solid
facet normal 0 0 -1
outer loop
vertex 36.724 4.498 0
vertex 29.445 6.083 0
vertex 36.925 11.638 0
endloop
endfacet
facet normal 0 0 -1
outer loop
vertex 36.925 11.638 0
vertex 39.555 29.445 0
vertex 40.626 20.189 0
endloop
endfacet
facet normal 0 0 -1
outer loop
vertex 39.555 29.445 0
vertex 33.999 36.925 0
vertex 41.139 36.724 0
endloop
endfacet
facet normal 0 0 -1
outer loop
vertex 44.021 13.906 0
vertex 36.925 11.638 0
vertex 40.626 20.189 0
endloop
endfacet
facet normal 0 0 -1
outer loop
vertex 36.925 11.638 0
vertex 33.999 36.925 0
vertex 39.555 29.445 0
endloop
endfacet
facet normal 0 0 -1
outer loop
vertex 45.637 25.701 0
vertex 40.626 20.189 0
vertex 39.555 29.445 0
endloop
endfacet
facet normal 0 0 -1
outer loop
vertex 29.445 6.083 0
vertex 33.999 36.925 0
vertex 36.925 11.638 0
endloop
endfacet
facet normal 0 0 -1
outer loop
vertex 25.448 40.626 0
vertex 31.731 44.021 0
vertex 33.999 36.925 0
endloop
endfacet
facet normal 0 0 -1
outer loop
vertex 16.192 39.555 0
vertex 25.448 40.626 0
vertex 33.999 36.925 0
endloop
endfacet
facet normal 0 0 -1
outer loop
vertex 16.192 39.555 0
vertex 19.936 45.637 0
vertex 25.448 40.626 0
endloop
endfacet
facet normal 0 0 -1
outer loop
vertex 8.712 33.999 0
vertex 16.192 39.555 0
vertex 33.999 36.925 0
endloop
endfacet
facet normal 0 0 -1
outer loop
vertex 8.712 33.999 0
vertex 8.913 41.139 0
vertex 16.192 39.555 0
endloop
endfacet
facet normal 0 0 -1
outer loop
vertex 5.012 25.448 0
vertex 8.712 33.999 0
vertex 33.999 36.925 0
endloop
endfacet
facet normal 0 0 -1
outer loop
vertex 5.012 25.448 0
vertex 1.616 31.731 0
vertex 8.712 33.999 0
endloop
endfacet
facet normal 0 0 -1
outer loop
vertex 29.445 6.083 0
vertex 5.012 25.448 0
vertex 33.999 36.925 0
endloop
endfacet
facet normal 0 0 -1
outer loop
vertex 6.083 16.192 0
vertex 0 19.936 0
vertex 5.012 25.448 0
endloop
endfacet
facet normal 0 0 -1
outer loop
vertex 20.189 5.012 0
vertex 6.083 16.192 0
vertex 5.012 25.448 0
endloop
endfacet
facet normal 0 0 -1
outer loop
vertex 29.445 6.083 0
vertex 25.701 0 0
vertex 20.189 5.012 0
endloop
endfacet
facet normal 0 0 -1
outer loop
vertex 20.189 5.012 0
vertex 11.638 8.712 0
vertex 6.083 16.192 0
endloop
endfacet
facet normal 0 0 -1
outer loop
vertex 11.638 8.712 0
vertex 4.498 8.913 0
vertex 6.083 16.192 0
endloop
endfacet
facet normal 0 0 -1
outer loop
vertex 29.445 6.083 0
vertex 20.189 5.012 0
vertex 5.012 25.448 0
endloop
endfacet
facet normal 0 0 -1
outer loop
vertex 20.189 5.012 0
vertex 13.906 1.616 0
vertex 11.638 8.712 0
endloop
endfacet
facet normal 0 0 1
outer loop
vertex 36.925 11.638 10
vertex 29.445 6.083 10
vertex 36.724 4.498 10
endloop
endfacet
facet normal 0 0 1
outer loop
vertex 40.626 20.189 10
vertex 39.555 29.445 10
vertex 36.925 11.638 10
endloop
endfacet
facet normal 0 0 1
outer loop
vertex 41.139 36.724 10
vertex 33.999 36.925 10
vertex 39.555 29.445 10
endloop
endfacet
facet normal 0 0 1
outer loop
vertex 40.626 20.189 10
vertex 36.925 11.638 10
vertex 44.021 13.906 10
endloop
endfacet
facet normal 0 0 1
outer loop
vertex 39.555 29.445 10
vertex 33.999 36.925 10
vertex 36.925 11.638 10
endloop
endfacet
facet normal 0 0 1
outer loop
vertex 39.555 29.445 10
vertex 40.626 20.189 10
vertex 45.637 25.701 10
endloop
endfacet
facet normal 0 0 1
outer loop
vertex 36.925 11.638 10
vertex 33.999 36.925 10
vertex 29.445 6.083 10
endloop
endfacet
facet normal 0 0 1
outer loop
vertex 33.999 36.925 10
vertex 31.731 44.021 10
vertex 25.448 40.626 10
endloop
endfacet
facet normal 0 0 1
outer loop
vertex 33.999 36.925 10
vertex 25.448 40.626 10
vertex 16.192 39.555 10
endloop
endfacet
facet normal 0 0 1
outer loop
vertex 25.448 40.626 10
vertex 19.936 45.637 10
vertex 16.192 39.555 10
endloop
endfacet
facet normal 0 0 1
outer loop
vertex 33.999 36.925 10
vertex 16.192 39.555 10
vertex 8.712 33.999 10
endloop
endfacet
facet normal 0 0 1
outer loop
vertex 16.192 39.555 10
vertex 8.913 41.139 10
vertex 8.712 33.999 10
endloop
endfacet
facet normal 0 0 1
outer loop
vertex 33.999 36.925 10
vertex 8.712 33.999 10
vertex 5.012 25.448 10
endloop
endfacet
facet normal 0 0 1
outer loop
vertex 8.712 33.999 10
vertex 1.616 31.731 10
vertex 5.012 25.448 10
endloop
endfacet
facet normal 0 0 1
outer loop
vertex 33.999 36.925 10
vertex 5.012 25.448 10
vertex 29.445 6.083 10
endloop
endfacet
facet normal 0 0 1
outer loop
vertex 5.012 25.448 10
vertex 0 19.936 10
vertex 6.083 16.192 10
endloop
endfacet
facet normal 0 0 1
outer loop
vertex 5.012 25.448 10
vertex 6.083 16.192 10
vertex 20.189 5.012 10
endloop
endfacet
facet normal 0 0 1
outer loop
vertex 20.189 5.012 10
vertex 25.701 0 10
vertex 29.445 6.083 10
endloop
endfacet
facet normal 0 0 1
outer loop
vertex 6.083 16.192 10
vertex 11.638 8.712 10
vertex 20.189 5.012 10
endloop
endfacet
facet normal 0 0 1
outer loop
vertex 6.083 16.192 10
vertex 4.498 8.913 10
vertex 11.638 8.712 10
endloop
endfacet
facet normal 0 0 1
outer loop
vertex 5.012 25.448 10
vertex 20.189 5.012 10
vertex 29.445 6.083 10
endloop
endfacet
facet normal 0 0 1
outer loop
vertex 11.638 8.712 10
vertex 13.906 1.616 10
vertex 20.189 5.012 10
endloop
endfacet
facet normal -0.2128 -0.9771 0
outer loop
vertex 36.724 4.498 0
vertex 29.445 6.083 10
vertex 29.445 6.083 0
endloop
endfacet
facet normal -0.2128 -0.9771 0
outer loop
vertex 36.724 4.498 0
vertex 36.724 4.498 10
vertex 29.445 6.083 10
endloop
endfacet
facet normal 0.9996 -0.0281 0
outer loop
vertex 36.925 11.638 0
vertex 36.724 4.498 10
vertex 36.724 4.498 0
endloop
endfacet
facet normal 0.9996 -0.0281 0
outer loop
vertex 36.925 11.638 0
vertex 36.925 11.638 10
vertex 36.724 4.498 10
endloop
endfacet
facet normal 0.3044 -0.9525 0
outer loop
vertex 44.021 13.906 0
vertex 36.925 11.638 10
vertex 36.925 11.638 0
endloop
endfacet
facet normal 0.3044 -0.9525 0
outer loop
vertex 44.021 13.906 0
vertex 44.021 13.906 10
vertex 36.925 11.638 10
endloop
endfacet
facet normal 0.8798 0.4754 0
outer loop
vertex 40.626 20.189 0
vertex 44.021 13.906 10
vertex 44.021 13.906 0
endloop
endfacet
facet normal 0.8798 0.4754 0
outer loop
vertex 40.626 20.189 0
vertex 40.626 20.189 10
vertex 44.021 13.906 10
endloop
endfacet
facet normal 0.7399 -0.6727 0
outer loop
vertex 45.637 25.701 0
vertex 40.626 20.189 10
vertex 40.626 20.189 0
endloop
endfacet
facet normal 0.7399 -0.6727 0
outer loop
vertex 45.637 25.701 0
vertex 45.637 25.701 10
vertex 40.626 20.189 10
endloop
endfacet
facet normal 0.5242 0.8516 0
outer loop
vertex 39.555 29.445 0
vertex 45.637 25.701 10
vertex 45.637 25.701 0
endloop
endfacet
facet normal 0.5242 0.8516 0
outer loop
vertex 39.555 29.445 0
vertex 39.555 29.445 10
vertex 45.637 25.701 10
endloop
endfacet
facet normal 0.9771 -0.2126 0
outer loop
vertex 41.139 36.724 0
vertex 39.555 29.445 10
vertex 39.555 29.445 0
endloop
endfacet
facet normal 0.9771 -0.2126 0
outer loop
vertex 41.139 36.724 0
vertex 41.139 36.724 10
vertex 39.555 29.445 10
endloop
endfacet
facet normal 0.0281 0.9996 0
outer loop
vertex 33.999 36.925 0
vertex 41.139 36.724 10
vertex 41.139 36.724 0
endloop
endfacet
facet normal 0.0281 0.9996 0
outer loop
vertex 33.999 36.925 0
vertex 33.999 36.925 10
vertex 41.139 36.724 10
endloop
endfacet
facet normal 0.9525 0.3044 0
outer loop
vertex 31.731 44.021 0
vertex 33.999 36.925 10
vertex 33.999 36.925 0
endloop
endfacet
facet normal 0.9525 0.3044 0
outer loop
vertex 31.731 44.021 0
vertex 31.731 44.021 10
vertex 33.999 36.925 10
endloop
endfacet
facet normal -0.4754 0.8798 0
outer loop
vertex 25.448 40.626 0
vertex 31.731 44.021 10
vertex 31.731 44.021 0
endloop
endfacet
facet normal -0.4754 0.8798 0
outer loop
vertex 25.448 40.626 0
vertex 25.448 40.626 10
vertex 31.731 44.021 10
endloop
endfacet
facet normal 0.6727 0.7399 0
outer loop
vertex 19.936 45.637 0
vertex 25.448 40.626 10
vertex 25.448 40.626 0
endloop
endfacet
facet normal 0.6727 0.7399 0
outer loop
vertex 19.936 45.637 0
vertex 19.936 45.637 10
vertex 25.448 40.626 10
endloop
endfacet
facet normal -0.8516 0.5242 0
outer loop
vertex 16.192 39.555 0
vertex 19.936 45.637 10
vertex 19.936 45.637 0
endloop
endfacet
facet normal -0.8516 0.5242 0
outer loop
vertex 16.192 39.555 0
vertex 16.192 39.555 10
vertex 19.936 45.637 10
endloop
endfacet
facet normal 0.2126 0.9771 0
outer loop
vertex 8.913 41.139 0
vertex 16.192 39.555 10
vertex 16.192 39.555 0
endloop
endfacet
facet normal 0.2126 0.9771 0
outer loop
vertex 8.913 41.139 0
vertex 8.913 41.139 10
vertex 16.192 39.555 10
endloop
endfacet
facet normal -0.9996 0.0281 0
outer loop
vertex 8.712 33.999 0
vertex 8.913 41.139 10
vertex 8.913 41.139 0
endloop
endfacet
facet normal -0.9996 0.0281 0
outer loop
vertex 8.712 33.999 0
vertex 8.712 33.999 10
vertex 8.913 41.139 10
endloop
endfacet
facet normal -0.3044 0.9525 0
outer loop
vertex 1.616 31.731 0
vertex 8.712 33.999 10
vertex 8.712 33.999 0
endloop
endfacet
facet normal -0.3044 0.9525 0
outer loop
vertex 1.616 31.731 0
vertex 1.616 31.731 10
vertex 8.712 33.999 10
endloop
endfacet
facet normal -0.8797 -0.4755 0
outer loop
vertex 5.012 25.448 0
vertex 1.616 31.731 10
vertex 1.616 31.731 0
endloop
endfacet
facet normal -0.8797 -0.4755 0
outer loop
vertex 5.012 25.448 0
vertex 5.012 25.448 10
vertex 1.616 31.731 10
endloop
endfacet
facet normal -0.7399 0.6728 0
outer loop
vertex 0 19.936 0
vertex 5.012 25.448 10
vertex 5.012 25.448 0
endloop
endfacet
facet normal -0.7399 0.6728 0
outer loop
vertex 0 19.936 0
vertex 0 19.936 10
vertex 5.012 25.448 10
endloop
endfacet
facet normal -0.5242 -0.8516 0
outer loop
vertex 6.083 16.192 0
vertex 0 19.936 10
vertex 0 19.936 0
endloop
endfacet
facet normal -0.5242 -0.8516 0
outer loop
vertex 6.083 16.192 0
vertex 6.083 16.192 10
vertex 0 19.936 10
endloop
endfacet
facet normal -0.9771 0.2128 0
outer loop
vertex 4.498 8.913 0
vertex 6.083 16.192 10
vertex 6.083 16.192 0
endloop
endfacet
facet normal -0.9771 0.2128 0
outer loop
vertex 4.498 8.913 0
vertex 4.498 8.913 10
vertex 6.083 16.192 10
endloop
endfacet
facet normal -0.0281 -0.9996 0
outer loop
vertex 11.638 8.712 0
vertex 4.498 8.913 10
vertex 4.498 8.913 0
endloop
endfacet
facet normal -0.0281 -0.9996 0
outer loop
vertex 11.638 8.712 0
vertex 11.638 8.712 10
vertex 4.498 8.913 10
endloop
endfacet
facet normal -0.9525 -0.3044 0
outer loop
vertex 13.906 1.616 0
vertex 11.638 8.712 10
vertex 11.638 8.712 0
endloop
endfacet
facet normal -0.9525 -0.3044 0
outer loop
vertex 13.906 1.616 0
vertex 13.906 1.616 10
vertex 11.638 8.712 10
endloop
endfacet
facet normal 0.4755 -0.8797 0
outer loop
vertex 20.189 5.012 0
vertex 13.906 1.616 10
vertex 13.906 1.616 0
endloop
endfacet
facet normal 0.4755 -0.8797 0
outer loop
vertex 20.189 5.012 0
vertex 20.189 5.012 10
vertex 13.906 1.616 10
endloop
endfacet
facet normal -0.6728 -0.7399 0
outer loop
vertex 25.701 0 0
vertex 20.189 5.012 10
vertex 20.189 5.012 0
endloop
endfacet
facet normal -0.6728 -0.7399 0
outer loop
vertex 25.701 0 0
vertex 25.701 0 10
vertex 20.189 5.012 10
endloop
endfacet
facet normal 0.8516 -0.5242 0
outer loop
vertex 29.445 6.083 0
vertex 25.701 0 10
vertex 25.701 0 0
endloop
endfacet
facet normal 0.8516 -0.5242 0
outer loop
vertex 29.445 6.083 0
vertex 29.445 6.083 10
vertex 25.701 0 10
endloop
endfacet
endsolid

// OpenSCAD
$fn = 32;

// ----------------------------------------------------------------------
// Chain sprocket: 12 teeth, 18 mm root radius
// ----------------------------------------------------------------------

// --- parameters (mm) ---
profile_height = 10;      // extrusion height
profile_points = 24;      // points of the closed outline

profile = [[40.626, 20.189], [45.637, 25.701], [39.555, 29.445], [41.139, 36.724], [33.999, 36.925], [31.731, 44.021], [25.448, 40.626], [19.936, 45.637], [16.192, 39.555], [8.913, 41.139], [8.712, 33.999], [1.616, 31.731], [5.012, 25.448], [0, 19.936], [6.083, 16.192], [4.498, 8.913], [11.638, 8.712], [13.906, 1.616], [20.189, 5.012], [25.701, 0], [29.445, 6.083], [36.724, 4.498], [36.925, 11.638], [44.021, 13.906]];  // single closed polygon, 24 points, counter clockwise

// --- the one profile operation ---
linear_extrude(height = profile_height) polygon(points = profile);
